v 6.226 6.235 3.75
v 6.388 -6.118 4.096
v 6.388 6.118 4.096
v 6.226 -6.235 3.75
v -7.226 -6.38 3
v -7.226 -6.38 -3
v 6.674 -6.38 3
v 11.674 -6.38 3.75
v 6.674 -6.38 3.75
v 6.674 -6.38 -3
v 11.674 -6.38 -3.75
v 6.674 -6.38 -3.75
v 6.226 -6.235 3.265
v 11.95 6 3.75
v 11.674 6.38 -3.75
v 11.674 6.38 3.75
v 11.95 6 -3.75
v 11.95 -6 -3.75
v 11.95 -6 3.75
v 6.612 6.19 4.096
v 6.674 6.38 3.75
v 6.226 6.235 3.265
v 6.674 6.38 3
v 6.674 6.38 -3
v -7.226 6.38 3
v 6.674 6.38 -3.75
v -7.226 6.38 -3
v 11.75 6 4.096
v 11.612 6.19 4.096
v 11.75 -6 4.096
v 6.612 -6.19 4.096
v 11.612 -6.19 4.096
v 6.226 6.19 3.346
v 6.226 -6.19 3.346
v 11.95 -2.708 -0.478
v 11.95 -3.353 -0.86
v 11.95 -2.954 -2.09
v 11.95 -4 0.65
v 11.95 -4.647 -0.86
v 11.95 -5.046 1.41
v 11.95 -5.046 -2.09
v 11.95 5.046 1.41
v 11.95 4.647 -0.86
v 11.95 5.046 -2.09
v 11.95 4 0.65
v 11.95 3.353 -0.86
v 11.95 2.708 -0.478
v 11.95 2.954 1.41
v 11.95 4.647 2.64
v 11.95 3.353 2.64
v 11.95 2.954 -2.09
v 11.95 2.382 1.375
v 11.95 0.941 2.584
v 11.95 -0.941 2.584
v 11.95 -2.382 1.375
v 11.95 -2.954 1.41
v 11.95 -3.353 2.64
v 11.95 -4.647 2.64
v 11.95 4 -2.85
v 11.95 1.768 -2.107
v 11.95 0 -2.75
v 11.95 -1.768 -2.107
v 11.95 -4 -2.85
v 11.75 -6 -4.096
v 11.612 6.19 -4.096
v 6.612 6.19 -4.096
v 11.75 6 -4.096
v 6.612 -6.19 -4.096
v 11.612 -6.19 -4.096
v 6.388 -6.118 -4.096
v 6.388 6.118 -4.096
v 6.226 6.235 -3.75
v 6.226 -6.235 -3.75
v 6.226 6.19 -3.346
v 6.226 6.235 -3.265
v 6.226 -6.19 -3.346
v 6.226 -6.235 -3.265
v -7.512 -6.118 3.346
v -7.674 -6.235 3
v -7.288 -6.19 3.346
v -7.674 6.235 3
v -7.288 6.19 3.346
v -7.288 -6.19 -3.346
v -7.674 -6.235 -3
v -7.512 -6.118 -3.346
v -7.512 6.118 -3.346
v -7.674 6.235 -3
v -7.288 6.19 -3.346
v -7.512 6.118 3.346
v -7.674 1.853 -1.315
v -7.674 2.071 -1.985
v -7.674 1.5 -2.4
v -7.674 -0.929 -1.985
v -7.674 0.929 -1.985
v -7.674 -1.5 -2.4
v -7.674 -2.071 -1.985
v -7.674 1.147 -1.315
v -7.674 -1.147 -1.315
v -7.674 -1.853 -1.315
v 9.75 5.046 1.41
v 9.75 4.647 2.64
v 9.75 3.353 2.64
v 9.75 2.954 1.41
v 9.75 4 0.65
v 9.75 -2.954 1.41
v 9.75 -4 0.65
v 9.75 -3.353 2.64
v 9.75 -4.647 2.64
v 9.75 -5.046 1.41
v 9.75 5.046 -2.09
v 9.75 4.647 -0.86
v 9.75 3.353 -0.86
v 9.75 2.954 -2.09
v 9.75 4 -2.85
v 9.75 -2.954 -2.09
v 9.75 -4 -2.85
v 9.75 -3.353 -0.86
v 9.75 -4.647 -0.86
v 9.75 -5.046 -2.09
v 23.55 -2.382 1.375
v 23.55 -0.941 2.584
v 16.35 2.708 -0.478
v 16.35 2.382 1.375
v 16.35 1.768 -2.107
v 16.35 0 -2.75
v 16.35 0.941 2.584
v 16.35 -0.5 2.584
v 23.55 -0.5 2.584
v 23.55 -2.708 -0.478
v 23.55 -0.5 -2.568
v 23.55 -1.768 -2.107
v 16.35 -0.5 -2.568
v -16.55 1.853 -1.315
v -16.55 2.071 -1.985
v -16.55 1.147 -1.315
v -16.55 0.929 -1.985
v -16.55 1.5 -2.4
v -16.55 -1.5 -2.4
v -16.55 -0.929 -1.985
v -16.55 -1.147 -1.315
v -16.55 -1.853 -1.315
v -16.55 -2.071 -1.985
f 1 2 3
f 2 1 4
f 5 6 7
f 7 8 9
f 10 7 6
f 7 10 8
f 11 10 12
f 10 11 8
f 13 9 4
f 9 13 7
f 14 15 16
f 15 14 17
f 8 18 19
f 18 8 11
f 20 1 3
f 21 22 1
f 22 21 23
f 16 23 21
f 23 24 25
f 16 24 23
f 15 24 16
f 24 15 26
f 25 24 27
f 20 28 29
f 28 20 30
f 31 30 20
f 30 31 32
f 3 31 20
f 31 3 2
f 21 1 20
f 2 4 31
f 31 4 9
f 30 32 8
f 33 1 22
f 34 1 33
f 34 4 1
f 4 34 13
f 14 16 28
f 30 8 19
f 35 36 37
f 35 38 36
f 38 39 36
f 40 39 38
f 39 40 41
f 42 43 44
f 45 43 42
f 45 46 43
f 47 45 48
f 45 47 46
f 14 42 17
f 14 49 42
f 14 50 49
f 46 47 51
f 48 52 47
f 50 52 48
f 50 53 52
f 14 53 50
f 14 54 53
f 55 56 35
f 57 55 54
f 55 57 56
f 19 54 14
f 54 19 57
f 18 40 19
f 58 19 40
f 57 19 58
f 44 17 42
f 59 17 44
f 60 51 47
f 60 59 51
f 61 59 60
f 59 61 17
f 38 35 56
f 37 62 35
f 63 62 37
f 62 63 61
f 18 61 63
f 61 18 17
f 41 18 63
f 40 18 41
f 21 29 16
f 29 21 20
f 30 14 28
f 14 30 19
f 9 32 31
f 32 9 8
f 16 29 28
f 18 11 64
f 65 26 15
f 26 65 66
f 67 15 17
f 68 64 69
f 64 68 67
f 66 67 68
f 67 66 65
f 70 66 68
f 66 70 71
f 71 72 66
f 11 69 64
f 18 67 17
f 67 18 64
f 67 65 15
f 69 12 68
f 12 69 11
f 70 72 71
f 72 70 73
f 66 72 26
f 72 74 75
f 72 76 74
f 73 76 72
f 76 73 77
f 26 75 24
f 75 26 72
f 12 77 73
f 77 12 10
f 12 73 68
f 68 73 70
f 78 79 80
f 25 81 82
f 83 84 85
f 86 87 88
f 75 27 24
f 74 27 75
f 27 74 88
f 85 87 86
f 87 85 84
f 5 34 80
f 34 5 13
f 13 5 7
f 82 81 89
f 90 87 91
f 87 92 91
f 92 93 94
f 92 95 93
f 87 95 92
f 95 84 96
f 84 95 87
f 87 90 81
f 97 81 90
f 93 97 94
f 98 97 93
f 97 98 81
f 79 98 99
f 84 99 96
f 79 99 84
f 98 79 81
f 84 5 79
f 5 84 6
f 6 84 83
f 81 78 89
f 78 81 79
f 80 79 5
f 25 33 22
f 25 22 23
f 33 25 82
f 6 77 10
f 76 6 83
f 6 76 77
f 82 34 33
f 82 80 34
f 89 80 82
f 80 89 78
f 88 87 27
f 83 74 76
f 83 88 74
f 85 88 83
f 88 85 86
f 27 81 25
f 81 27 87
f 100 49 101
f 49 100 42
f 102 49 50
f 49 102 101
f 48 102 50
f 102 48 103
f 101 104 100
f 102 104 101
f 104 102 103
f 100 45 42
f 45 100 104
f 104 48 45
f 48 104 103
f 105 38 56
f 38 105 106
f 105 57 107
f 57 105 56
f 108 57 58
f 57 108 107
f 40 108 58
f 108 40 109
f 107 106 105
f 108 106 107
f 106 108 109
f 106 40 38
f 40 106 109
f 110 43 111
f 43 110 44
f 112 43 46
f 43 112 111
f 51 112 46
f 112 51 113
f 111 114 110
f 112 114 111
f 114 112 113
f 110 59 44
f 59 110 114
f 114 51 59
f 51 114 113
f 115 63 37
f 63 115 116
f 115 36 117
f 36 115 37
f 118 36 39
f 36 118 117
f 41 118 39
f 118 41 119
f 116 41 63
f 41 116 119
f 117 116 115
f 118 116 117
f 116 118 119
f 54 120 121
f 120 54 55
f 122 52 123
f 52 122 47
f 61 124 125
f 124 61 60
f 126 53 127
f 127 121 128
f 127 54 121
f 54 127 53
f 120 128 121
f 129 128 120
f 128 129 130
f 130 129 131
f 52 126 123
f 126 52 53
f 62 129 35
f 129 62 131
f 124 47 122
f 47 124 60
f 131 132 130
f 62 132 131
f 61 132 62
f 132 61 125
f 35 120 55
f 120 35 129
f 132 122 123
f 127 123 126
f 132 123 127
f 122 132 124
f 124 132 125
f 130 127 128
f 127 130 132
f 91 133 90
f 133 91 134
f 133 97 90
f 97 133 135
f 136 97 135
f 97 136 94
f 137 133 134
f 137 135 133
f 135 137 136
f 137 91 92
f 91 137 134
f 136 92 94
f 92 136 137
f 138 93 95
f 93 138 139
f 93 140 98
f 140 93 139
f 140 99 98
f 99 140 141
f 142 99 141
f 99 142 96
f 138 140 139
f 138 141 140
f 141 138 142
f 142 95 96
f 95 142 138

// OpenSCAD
// Parameters
body_L = 14.7; //[7.35:29.4:0.1]
body_W = 12.0; //[6.0:24.0:0.1]
body_H = 6.0; //[3.0:12.0:0.1]
shaft_D = 5.5; //[2.75:11.0:0.1]
shaft_L = 12.0; //[6.0:24.0:0.1]
gearbox_step_L = 4.0; //[2.0:8.0:0.1]
gearbox_step_H = 1.5; //[0.75:3.0:0.1]
mount_face_t = 1.0; //[0.5:2.0:0.1]
overlap = 0.8; //[0.5:2.0:0.1]
mount_hole_D = 2.2; //[1.0:4.0:0.1]
mount_hole_edge_margin = 2.0; //[1.0:4.0:0.1]
shaft_flat_depth = 1.0; //[0.5:2.0:0.1]
shaft_flat_L = 8.0; //[4.0:16.0:0.1]
wire_D = 1.2; //[0.6:2.4:0.1]
wire_L = 10.0; //[5.0:20.0:0.1]
wire_spacing = 3.0; //[1.5:6.0:0.1]
label_L = 8.0; //[4.0:16.0:0.1]
label_W = 6.0; //[3.0:12.0:0.1]
label_t = 0.6; //[0.3:1.2:0.1]
fillet_r = 0.4; //[0.2:1.0:0.1]

// Base Shapes
module housing_body() {
  cube([body_L, body_W, body_H], center=true);
}

module gearbox_step() {
  cube([gearbox_step_L, body_W, body_H + gearbox_step_H], center=true);
}

module mounting_face() {
  cube([mount_face_t, body_W, body_H + gearbox_step_H], center=true);
}

module output_shaft() {
  rotate([0, 90, 0])
    cylinder(h=shaft_L, r=shaft_D/2, center=true);
}

module mount_hole() {
  rotate([0, 90, 0])
    cylinder(h=mount_face_t + 2*overlap, r=mount_hole_D/2, center=true);
}

module shaft_flat_cutter() {
  cube([shaft_flat_L, shaft_D, shaft_D], center=true);
}

module wire_lead() {
  rotate([0, 90, 0])
    cylinder(h=wire_L, r=wire_D/2, center=true);
}

module label_plate() {
  cube([label_L, label_W, label_t], center=true);
}

module fillet_sphere() {
  sphere(r=fillet_r, center=true);
}

// Operations
module housing_union_raw() {
  union() {
    translate([0, 0, 0]) housing_body();
    translate([body_L/2 + gearbox_step_L/2 - overlap, 0, 0]) gearbox_step();
    translate([body_L/2 + gearbox_step_L + mount_face_t/2 - overlap, 0, 0]) mounting_face();
  }
}

module fillets_chamfers() {
  minkowski() {
    housing_union_raw();
    fillet_sphere();
  }
}

module mounting_holes() {
  difference() {
    fillets_chamfers();
    translate([body_L/2 + gearbox_step_L + mount_face_t/2 - overlap, body_W/2 - mount_hole_edge_margin, body_H/2 + gearbox_step_H/2 - mount_hole_edge_margin]) mount_hole();
    translate([body_L/2 + gearbox_step_L + mount_face_t/2 - overlap, -(body_W/2 - mount_hole_edge_margin), body_H/2 + gearbox_step_H/2 - mount_hole_edge_margin]) mount_hole();
    translate([body_L/2 + gearbox_step_L + mount_face_t/2 - overlap, body_W/2 - mount_hole_edge_margin, -(body_H/2 + gearbox_step_H/2 - mount_hole_edge_margin)]) mount_hole();
    translate([body_L/2 + gearbox_step_L + mount_face_t/2 - overlap, -(body_W/2 - mount_hole_edge_margin), -(body_H/2 + gearbox_step_H/2 - mount_hole_edge_margin)]) mount_hole();
  }
}

module output_shaft_with_flat() {
  difference() {
    translate([body_L/2 + gearbox_step_L + mount_face_t + shaft_L/2 - overlap, 0, 0]) output_shaft();
    translate([body_L/2 + gearbox_step_L + mount_face_t + shaft_L - shaft_flat_L/2, shaft_D/2 - shaft_flat_depth/2, 0]) shaft_flat_cutter();
  }
}

module motor_complete() {
  union() {
    mounting_holes();
    output_shaft_with_flat();
    translate([-(body_L/2 + wire_L/2 - overlap), wire_spacing/2, -(body_H/2 - wire_D)]) wire_lead();
    translate([-(body_L/2 + wire_L/2 - overlap), -wire_spacing/2, -(body_H/2 - wire_D)]) wire_lead();
    translate([0, 0, body_H/2 + label_t/2 - overlap]) label_plate();
  }
}

// Final Output
motor_complete();
